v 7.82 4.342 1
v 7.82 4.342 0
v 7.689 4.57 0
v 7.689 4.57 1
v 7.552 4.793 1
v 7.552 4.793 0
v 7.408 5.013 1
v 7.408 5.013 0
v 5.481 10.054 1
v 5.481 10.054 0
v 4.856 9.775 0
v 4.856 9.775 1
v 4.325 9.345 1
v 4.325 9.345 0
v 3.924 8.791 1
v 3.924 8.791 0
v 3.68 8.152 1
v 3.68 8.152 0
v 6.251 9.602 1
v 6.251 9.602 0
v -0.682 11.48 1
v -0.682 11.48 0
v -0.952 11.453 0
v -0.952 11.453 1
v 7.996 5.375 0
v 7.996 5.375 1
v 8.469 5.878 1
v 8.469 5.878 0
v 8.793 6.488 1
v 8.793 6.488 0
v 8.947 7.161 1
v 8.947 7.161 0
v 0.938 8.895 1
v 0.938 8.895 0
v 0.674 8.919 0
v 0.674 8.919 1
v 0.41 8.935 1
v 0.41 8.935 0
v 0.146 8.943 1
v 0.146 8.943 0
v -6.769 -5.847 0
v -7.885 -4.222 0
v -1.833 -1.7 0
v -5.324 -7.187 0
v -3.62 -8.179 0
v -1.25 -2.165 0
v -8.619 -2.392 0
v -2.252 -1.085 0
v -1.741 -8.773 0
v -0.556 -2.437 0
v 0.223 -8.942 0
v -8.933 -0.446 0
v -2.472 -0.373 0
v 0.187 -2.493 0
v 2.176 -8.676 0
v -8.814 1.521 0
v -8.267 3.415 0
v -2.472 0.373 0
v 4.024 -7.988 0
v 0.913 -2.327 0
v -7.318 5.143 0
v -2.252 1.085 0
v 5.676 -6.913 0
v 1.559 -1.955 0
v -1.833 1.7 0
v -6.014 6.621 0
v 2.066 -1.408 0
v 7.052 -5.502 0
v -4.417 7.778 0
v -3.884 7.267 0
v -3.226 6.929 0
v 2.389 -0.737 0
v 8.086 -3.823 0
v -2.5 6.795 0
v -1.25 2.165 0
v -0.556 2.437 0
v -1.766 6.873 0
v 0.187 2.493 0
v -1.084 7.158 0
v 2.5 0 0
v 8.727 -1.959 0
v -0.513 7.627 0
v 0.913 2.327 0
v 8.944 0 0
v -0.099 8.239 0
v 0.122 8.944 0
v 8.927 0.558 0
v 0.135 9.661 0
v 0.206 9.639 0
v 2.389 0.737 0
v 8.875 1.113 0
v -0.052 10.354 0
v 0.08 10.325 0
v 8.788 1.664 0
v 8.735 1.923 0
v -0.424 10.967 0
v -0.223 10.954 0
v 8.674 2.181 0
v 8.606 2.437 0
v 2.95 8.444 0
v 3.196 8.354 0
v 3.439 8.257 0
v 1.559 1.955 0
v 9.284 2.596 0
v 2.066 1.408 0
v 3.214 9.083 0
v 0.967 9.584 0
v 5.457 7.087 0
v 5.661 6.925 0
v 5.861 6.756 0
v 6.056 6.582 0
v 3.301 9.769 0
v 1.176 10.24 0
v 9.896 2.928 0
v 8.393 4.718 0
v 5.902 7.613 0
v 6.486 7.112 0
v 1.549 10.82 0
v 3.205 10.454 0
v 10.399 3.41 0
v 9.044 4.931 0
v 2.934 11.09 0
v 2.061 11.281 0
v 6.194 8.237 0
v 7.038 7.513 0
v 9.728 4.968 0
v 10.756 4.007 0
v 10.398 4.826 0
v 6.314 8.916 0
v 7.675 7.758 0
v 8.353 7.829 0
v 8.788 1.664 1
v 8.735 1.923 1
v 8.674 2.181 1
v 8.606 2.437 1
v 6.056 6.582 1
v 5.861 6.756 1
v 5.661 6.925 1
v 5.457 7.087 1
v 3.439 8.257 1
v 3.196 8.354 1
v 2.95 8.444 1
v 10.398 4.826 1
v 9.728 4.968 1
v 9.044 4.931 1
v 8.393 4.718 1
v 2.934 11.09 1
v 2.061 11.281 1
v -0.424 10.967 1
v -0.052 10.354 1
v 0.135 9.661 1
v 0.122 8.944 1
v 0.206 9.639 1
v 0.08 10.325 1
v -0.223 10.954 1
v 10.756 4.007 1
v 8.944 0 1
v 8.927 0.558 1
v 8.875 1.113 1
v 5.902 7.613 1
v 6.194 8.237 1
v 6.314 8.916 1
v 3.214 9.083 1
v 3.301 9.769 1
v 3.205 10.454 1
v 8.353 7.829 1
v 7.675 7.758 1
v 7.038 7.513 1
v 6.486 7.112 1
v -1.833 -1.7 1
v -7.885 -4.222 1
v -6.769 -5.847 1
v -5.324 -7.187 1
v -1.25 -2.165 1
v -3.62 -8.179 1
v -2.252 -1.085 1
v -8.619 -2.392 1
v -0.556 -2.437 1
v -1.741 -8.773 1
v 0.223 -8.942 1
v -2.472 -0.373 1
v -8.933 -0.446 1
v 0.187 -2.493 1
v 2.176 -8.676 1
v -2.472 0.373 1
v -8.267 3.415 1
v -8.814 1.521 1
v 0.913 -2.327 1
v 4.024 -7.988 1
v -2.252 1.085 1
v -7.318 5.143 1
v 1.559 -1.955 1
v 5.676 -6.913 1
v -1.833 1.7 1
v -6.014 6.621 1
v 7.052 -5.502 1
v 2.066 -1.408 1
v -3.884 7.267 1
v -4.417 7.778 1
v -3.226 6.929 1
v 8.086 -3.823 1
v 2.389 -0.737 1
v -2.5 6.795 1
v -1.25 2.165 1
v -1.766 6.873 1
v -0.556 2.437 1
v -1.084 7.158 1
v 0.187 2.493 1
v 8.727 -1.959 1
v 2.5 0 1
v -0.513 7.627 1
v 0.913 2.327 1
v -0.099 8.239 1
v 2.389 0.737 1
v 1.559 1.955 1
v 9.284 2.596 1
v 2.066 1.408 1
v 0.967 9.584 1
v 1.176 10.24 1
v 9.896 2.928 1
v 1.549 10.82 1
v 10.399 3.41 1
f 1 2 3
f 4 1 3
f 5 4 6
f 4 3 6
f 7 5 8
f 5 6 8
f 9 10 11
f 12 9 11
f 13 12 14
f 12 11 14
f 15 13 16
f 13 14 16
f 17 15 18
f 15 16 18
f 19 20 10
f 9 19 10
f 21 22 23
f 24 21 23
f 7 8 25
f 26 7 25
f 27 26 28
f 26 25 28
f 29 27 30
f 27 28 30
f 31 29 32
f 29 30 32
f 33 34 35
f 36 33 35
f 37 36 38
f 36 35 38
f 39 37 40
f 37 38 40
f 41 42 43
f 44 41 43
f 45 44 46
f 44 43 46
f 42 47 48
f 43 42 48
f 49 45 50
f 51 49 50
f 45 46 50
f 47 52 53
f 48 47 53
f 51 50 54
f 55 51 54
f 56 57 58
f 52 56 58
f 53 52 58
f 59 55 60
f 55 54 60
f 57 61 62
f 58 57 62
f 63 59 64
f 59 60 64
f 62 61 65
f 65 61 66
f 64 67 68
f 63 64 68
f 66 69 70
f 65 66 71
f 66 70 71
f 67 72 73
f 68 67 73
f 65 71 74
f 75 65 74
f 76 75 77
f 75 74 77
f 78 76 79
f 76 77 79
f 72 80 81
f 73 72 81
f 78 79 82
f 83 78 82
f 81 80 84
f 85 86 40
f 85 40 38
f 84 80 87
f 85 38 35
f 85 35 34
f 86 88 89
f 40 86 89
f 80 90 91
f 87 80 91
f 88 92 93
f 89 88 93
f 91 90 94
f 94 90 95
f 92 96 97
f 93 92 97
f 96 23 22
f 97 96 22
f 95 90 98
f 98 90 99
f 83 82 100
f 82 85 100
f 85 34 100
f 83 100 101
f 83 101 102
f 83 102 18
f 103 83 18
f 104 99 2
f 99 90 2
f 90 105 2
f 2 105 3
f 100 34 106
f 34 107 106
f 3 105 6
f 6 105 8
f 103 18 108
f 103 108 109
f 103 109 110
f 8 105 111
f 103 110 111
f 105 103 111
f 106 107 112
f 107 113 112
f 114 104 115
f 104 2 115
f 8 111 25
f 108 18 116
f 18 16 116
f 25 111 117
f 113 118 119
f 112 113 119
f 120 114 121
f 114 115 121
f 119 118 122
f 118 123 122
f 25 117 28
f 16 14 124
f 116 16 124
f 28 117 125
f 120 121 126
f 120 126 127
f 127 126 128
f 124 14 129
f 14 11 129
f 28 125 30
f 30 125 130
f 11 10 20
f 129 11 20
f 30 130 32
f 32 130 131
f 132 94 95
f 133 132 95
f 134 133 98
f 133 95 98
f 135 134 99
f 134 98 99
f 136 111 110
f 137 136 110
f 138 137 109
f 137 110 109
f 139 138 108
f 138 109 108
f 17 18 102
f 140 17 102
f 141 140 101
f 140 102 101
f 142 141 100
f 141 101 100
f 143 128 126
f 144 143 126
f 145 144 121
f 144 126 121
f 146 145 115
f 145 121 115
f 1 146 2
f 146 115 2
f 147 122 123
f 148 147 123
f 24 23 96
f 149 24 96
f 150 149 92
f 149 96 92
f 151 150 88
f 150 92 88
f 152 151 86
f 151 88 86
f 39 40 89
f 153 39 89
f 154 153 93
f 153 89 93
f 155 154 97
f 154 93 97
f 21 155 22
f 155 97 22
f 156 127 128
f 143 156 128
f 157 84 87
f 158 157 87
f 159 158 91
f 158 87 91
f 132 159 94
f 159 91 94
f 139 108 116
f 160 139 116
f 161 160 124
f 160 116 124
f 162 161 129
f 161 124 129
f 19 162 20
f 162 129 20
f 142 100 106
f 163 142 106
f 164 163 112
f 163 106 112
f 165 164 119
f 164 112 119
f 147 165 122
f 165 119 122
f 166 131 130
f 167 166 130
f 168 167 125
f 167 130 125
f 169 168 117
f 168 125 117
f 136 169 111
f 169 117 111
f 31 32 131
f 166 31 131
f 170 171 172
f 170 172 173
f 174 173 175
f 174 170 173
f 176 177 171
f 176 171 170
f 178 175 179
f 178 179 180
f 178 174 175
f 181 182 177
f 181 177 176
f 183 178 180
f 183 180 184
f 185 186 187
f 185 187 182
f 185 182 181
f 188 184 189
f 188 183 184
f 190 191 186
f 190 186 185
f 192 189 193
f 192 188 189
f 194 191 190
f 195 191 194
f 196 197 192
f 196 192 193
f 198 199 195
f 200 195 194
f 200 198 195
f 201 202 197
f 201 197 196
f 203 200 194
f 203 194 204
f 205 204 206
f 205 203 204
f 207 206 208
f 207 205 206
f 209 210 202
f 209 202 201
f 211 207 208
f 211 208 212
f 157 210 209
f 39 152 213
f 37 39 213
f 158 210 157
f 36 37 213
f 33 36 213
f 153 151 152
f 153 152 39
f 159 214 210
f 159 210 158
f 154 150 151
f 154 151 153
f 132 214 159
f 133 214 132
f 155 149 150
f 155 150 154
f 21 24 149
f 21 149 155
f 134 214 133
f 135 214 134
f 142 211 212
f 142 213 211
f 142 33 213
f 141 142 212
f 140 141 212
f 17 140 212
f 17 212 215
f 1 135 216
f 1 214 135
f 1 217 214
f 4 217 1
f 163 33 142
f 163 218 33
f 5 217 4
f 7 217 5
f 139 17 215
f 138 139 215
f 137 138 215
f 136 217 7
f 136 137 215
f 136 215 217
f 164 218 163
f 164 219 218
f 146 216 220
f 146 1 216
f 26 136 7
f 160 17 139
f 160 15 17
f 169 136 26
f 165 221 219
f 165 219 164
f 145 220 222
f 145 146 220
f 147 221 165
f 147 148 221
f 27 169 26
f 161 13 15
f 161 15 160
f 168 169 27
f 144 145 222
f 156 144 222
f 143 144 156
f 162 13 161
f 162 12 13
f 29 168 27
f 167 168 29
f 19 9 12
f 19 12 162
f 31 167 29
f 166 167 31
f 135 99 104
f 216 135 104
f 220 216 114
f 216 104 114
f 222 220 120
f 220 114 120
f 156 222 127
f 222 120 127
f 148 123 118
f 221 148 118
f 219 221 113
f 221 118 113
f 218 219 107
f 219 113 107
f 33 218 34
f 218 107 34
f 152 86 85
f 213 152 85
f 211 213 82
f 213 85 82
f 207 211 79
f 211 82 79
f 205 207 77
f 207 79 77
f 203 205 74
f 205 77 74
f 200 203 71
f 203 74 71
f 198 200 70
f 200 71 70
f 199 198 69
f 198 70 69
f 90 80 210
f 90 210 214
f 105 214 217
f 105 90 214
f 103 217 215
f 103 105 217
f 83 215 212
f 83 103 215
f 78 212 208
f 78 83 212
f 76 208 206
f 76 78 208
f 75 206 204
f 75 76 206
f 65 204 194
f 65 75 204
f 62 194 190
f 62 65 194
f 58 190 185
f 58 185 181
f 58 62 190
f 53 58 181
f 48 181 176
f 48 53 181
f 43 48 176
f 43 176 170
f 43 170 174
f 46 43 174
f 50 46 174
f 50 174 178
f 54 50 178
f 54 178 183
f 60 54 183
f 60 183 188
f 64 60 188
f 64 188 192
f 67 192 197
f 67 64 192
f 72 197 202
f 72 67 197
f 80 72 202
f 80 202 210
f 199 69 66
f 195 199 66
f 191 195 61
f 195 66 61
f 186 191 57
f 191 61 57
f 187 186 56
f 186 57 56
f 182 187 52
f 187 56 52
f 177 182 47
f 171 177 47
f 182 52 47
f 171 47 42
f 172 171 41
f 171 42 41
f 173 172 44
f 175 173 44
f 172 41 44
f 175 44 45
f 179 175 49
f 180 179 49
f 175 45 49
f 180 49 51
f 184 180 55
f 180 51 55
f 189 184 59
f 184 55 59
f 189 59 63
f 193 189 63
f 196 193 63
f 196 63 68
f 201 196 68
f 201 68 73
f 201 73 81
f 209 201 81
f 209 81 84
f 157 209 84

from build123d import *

# Parameters (mm, degrees)
F2_R     = 2.5
F3_DEPTH = 1


# Not quite as in the source:
# - a feature of the source that left no trace in its solid (it failed there, or was rolled back) is left out


with BuildPart() as f3:
    # F2 (on Top) → F3 (new body)
    with BuildSketch(Plane.XY):
        with BuildLine():
            ThreePointArc((-0.9522931143, 11.4531284813), (-0.0520635974, 10.3538099613), (0.1218940174, 8.943613826))
            ThreePointArc((0.1218940174, 8.943613826), (0.1337416353, 8.9434445039), (0.1455890186, 8.9432594873))
            ThreePointArc((0.1455890186, 8.9432594873), (0.0799521539, 10.3250380062), (-0.6817601701, 11.4797736507))
            Line((-0.6817601701, 11.4797736507), (-0.9522931143, 11.4531284813))
        make_face()
        with BuildLine():
            ThreePointArc((-4.4173624076, 7.7775314708), (-4.4995685223, -7.7302632253), (8.9444444444, 0))
            ThreePointArc((8.9444444444, 0), (8.9053271725, 0.8356041947), (8.7883175045, 1.6638995942))
            ThreePointArc((8.7883175045, 1.6638995942), (8.7057555111, 2.0525368209), (8.6060160514, 2.4371241541))
            ThreePointArc((8.6060160514, 2.4371241541), (8.2679218833, 3.4124117792), (7.8197142384, 4.3422523705))
            ThreePointArc((7.8197142384, 4.3422523705), (7.6211518715, 4.6820007018), (7.4078378155, 5.0126864374))
            ThreePointArc((7.4078378155, 5.0126864374), (6.7776596323, 5.8366442695), (6.0563228133, 6.5820999993))
            ThreePointArc((6.0563228133, 6.5820999993), (5.761965129, 6.84126043), (5.4565297326, 7.0872681406))
            ThreePointArc((5.4565297326, 7.0872681406), (4.5991510413, 7.6714337721), (3.6798961663, 8.1523892587))
            ThreePointArc((3.6798961663, 8.1523892587), (3.3179634912, 8.306275019), (2.9496159434, 8.4441016222))
            ThreePointArc((2.9496159434, 8.4441016222), (1.9566672267, 8.7278026893), (0.937636324, 8.8951629858))
            ThreePointArc((0.937636324, 8.8951629858), (0.542146294, 8.9279988696), (0.1455890186, 8.9432594873))
            ThreePointArc((0.1455890186, 8.9432594873), (0.1337416353, 8.9434445039), (0.1218940174, 8.943613826))
            ThreePointArc((0.1218940174, 8.943613826), (-1.7655892516, 6.8729814141), (-4.4173624076, 7.7775314708))
        make_face()
        Circle(F2_R, mode=Mode.SUBTRACT)
        with BuildLine():
            ThreePointArc((7.8197142384, 4.3422523705), (8.2679218833, 3.4124117792), (8.6060160514, 2.4371241541))
            ThreePointArc((8.6060160514, 2.4371241541), (9.8961633699, 2.9277974972), (10.7564598893, 4.0072095278))
            Line((10.7564598893, 4.0072095278), (10.398401005, 4.8258001529))
            ThreePointArc((10.398401005, 4.8258001529), (9.0439881545, 4.931031832), (7.8197142384, 4.3422523705))
        make_face()
        with BuildLine():
            ThreePointArc((6.0563228133, 6.5820999993), (6.7776596323, 5.8366442695), (7.4078378155, 5.0126864374))
            ThreePointArc((7.4078378155, 5.0126864374), (8.4689810733, 5.8780879937), (8.9469442237, 7.1612466333))
            Line((8.9469442237, 7.1612466333), (8.3534515739, 7.8291263012))
            ThreePointArc((8.3534515739, 7.8291263012), (7.0378063332, 7.5133903393), (6.0563228133, 6.5820999993))
        make_face()
        with BuildLine():
            ThreePointArc((3.6798961663, 8.1523892587), (4.5991510413, 7.6714337721), (5.4565297326, 7.0872681406))
            ThreePointArc((5.4565297326, 7.0872681406), (6.194311581, 8.236914632), (6.251341492, 9.6017430828))
            Line((6.251341492, 9.6017430828), (5.4805102725, 10.0535350783))
            ThreePointArc((5.4805102725, 10.0535350783), (4.3249499065, 9.344717804), (3.6798961663, 8.1523892587))
        make_face()
        with BuildLine():
            ThreePointArc((2.0608006124, 11.2812858546), (1.1761963647, 10.2402731247), (0.937636324, 8.8951629858))
            ThreePointArc((0.937636324, 8.8951629858), (1.9566672267, 8.7278026893), (2.9496159434, 8.4441016222))
            ThreePointArc((2.9496159434, 8.4441016222), (3.3010678965, 9.7691415234), (2.9335160712, 11.08980608))
            Line((2.9335160712, 11.08980608), (2.0608006124, 11.2812858546))
        make_face()
    extrude(amount=F3_DEPTH)


solid = f3.part
